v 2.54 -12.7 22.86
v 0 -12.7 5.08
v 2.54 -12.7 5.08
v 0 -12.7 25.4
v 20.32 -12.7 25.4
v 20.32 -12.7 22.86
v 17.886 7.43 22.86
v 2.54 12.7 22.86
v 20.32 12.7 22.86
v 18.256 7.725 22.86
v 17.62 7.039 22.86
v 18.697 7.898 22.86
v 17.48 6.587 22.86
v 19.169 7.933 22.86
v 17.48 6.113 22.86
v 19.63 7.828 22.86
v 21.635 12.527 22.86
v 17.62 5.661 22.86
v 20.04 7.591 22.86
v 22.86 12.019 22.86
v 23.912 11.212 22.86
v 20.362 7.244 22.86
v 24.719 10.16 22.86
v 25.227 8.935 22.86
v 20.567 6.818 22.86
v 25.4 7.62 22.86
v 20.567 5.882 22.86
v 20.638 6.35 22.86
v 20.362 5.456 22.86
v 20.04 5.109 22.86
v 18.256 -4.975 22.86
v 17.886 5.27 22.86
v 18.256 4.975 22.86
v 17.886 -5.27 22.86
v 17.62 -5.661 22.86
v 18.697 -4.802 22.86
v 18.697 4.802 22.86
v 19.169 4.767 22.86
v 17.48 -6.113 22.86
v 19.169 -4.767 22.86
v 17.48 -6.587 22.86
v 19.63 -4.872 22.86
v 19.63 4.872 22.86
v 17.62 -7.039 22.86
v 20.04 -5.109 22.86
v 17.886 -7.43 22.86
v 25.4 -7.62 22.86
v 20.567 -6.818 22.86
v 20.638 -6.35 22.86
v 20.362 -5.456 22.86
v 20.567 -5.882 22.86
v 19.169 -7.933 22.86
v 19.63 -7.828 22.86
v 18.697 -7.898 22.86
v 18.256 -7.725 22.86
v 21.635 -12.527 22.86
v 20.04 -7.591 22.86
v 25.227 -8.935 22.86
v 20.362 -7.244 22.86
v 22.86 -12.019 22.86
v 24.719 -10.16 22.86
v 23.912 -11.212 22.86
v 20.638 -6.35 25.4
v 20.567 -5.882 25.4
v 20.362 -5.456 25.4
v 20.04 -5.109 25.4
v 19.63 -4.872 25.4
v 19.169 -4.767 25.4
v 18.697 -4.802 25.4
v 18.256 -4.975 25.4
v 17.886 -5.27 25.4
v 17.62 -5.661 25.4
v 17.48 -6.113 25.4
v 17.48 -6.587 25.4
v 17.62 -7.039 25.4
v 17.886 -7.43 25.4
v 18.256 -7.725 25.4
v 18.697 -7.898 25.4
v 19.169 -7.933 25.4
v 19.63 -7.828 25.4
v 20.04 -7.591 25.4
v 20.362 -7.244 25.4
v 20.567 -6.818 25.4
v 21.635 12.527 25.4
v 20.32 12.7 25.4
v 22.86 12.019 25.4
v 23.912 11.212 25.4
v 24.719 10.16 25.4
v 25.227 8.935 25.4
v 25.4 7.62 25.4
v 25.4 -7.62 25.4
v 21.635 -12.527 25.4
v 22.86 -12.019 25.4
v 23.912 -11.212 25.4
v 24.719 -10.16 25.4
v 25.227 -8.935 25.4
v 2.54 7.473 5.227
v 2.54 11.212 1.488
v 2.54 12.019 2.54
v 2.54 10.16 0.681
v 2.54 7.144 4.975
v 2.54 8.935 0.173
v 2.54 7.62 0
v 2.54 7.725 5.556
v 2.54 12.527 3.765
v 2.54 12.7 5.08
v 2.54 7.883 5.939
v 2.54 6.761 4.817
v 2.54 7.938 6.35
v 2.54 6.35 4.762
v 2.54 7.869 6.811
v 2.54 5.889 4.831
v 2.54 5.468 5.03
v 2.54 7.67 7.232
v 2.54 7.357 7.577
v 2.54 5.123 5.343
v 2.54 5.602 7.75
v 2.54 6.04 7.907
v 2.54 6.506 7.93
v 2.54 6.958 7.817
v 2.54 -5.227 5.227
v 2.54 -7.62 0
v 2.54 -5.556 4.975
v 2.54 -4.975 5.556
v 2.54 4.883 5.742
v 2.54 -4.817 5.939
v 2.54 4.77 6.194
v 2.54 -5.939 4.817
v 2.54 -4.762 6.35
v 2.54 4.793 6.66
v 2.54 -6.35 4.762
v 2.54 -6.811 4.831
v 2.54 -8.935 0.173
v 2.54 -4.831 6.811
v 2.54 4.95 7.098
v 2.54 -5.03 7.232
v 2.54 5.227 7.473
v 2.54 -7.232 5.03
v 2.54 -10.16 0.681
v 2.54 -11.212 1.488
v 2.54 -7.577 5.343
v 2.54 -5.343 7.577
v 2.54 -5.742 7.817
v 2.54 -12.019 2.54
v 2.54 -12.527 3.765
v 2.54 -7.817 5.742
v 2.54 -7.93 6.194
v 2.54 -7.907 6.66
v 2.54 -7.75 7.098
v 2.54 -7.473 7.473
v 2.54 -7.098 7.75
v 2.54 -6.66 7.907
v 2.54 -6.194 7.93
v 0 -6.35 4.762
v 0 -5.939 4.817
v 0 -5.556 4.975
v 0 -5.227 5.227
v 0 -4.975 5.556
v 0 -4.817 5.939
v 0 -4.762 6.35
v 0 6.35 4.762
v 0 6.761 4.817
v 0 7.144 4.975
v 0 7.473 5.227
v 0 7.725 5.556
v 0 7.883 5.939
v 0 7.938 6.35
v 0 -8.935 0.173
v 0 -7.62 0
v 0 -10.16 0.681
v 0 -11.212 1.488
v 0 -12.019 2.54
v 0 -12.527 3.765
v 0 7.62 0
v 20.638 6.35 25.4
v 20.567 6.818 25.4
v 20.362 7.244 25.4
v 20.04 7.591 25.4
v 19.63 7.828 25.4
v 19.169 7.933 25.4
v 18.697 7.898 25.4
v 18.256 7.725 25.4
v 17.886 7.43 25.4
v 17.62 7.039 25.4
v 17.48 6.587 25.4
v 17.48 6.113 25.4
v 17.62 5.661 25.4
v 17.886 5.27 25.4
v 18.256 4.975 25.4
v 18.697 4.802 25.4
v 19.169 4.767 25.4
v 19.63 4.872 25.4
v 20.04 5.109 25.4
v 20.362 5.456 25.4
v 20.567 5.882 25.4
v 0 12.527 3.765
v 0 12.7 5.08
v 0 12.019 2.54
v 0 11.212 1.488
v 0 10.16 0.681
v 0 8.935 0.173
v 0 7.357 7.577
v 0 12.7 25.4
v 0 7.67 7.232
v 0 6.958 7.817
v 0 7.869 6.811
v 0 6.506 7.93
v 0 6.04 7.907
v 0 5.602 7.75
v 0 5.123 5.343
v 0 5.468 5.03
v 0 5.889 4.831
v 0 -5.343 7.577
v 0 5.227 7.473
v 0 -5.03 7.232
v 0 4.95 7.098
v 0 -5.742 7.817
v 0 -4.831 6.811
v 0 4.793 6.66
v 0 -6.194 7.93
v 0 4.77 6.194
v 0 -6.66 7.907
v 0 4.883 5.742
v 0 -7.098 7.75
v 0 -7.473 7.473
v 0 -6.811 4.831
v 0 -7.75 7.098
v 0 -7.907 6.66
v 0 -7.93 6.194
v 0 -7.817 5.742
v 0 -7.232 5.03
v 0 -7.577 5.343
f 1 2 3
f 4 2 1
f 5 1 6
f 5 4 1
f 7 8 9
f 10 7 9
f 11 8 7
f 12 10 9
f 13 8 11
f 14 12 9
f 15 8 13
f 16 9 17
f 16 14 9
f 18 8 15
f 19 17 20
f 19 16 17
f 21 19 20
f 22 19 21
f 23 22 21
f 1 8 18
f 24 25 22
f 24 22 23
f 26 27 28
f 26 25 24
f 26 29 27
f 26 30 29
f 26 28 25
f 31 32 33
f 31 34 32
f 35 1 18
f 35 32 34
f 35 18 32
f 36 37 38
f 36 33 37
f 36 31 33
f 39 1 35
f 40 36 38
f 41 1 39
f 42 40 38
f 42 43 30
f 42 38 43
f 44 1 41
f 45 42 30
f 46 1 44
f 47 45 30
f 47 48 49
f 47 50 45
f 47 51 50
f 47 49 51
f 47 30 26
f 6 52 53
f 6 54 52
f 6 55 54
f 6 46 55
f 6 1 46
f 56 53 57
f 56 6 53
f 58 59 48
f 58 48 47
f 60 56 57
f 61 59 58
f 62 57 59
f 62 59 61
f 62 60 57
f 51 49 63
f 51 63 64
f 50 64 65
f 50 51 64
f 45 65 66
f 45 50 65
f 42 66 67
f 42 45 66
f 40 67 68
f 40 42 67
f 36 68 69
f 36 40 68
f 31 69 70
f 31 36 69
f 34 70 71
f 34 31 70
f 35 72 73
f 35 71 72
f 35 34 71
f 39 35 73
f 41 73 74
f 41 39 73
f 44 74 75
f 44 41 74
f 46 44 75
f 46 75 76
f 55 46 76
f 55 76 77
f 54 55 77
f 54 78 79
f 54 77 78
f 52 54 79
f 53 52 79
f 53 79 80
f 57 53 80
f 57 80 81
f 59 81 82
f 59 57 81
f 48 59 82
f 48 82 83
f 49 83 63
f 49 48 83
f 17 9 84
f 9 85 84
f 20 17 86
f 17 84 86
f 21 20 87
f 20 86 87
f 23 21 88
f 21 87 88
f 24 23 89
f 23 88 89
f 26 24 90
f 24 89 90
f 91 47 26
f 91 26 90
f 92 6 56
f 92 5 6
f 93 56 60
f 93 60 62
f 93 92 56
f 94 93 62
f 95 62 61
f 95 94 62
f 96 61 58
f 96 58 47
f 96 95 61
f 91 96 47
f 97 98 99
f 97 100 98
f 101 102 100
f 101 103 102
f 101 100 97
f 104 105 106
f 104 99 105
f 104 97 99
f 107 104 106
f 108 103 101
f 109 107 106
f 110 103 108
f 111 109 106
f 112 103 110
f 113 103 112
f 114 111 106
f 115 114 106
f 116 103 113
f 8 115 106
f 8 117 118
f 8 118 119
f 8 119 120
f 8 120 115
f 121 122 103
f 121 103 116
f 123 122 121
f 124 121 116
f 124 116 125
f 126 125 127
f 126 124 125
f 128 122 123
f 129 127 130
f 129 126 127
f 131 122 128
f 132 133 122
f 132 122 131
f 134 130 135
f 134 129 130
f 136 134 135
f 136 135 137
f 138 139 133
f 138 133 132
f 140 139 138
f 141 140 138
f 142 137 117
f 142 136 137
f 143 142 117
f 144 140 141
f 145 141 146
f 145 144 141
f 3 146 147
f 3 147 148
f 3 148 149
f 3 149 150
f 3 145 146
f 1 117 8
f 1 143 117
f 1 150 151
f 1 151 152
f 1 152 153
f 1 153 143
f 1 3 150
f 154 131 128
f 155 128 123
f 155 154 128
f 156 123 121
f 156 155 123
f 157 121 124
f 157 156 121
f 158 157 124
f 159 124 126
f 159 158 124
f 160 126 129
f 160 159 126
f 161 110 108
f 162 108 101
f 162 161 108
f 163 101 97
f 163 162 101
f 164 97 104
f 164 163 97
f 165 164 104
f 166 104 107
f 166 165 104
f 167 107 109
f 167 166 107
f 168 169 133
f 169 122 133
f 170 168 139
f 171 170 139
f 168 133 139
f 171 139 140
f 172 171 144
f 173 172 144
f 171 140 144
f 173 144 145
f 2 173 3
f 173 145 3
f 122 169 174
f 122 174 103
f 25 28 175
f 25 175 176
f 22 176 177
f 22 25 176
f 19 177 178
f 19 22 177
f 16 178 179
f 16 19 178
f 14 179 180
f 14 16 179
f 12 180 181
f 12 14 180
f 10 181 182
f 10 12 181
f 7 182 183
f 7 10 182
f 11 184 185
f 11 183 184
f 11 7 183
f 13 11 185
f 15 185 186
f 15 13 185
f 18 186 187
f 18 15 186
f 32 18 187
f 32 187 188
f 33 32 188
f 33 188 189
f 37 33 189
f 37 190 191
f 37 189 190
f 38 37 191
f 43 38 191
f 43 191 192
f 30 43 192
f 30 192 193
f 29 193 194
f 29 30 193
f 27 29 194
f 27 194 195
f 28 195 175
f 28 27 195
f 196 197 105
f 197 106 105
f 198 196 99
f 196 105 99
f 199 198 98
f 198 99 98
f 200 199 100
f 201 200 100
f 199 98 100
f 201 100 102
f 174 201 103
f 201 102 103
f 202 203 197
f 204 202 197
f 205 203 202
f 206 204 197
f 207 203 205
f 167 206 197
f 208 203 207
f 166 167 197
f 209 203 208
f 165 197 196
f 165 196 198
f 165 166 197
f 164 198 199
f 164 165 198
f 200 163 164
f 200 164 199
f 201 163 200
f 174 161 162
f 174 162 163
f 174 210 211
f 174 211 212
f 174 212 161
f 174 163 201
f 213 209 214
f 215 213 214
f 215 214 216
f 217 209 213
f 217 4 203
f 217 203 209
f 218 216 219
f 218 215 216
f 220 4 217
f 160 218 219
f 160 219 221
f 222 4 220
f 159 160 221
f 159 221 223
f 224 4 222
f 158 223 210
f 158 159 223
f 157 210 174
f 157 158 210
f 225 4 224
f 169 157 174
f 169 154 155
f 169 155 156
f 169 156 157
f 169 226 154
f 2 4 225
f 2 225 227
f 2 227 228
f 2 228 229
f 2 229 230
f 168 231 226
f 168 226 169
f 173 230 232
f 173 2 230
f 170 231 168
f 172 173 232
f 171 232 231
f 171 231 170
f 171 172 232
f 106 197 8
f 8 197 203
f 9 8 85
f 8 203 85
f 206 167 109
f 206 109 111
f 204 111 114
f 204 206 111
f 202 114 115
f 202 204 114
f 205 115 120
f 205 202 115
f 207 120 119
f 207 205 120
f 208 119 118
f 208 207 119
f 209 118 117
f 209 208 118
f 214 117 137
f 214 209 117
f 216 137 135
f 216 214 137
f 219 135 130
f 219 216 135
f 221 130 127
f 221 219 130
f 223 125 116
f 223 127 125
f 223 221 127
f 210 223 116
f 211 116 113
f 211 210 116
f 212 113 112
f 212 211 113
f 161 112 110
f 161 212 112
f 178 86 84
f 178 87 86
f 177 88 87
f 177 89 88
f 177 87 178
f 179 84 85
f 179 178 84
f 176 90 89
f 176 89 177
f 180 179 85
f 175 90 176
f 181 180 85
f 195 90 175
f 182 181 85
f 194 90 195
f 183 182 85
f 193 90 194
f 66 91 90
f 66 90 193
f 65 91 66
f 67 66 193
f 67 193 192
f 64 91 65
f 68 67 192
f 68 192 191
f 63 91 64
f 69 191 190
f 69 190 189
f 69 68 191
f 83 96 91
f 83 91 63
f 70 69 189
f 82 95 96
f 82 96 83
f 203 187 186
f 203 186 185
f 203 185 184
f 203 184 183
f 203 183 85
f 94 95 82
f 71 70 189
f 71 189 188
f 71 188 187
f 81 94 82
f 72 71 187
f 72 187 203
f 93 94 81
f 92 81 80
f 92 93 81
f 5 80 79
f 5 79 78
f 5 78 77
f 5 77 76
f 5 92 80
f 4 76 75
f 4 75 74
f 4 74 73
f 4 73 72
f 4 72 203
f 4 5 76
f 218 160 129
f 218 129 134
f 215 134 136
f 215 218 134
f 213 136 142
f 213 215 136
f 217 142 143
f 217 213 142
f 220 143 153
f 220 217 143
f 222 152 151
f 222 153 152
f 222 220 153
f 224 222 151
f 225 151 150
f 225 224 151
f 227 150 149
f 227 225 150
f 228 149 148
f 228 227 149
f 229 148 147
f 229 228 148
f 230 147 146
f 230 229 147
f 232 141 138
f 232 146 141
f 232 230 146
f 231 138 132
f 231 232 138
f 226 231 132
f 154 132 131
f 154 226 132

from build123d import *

# Parameters (mm, degrees)
F3_DEPTH = 12.7
F1_R     = 1.5875
F4_DEPTH = 39.37
F5_DEPTH = 8.382
F6_R     = 5.08


with BuildPart() as f3:
    # F0 (on Front) → F3 (new body, symmetric)
    with BuildSketch(Plane.XZ):
        Polygon((0, 25.4), (0, 0), (2.54, 0), (2.54, 22.86), (25.4, 22.86), (25.4, 25.4), align=None)
    extrude(amount=F3_DEPTH, both=True)

    # F1 (on Top) → F4 (cut)
    with BuildSketch(Plane.XY):
        with Locations((19.05, 6.35)):
            Circle(F1_R)
        with Locations((19.05, -6.35)):
            Circle(F1_R)
    extrude(amount=F4_DEPTH, mode=Mode.SUBTRACT)

    # F2 (on Right) → F5 (cut)
    with BuildSketch(Plane.YZ):
        with BuildLine():
            ThreePointArc((7.9375, 6.35), (5.227468, 7.472532), (6.35, 4.7625))
            ThreePointArc((6.35, 4.7625), (7.472532, 5.227468), (7.9375, 6.35))
        make_face()
        with BuildLine():
            ThreePointArc((-4.7625, 6.35), (-7.472532, 7.472532), (-6.35, 4.7625))
            ThreePointArc((-6.35, 4.7625), (-5.227468, 5.227468), (-4.7625, 6.35))
        make_face()
    extrude(amount=F5_DEPTH, mode=Mode.SUBTRACT)

    # F6
    f6_edges = [f3.edges().sort_by_distance(p)[0] for p in [
        (25.4, -12.7, 24.13),
        (25.4, 12.7, 24.13),
        (1.27, -12.7, 0),
        (1.27, 12.7, 0),
    ]]
    fillet(f6_edges, radius=F6_R)


solid = f3.part
